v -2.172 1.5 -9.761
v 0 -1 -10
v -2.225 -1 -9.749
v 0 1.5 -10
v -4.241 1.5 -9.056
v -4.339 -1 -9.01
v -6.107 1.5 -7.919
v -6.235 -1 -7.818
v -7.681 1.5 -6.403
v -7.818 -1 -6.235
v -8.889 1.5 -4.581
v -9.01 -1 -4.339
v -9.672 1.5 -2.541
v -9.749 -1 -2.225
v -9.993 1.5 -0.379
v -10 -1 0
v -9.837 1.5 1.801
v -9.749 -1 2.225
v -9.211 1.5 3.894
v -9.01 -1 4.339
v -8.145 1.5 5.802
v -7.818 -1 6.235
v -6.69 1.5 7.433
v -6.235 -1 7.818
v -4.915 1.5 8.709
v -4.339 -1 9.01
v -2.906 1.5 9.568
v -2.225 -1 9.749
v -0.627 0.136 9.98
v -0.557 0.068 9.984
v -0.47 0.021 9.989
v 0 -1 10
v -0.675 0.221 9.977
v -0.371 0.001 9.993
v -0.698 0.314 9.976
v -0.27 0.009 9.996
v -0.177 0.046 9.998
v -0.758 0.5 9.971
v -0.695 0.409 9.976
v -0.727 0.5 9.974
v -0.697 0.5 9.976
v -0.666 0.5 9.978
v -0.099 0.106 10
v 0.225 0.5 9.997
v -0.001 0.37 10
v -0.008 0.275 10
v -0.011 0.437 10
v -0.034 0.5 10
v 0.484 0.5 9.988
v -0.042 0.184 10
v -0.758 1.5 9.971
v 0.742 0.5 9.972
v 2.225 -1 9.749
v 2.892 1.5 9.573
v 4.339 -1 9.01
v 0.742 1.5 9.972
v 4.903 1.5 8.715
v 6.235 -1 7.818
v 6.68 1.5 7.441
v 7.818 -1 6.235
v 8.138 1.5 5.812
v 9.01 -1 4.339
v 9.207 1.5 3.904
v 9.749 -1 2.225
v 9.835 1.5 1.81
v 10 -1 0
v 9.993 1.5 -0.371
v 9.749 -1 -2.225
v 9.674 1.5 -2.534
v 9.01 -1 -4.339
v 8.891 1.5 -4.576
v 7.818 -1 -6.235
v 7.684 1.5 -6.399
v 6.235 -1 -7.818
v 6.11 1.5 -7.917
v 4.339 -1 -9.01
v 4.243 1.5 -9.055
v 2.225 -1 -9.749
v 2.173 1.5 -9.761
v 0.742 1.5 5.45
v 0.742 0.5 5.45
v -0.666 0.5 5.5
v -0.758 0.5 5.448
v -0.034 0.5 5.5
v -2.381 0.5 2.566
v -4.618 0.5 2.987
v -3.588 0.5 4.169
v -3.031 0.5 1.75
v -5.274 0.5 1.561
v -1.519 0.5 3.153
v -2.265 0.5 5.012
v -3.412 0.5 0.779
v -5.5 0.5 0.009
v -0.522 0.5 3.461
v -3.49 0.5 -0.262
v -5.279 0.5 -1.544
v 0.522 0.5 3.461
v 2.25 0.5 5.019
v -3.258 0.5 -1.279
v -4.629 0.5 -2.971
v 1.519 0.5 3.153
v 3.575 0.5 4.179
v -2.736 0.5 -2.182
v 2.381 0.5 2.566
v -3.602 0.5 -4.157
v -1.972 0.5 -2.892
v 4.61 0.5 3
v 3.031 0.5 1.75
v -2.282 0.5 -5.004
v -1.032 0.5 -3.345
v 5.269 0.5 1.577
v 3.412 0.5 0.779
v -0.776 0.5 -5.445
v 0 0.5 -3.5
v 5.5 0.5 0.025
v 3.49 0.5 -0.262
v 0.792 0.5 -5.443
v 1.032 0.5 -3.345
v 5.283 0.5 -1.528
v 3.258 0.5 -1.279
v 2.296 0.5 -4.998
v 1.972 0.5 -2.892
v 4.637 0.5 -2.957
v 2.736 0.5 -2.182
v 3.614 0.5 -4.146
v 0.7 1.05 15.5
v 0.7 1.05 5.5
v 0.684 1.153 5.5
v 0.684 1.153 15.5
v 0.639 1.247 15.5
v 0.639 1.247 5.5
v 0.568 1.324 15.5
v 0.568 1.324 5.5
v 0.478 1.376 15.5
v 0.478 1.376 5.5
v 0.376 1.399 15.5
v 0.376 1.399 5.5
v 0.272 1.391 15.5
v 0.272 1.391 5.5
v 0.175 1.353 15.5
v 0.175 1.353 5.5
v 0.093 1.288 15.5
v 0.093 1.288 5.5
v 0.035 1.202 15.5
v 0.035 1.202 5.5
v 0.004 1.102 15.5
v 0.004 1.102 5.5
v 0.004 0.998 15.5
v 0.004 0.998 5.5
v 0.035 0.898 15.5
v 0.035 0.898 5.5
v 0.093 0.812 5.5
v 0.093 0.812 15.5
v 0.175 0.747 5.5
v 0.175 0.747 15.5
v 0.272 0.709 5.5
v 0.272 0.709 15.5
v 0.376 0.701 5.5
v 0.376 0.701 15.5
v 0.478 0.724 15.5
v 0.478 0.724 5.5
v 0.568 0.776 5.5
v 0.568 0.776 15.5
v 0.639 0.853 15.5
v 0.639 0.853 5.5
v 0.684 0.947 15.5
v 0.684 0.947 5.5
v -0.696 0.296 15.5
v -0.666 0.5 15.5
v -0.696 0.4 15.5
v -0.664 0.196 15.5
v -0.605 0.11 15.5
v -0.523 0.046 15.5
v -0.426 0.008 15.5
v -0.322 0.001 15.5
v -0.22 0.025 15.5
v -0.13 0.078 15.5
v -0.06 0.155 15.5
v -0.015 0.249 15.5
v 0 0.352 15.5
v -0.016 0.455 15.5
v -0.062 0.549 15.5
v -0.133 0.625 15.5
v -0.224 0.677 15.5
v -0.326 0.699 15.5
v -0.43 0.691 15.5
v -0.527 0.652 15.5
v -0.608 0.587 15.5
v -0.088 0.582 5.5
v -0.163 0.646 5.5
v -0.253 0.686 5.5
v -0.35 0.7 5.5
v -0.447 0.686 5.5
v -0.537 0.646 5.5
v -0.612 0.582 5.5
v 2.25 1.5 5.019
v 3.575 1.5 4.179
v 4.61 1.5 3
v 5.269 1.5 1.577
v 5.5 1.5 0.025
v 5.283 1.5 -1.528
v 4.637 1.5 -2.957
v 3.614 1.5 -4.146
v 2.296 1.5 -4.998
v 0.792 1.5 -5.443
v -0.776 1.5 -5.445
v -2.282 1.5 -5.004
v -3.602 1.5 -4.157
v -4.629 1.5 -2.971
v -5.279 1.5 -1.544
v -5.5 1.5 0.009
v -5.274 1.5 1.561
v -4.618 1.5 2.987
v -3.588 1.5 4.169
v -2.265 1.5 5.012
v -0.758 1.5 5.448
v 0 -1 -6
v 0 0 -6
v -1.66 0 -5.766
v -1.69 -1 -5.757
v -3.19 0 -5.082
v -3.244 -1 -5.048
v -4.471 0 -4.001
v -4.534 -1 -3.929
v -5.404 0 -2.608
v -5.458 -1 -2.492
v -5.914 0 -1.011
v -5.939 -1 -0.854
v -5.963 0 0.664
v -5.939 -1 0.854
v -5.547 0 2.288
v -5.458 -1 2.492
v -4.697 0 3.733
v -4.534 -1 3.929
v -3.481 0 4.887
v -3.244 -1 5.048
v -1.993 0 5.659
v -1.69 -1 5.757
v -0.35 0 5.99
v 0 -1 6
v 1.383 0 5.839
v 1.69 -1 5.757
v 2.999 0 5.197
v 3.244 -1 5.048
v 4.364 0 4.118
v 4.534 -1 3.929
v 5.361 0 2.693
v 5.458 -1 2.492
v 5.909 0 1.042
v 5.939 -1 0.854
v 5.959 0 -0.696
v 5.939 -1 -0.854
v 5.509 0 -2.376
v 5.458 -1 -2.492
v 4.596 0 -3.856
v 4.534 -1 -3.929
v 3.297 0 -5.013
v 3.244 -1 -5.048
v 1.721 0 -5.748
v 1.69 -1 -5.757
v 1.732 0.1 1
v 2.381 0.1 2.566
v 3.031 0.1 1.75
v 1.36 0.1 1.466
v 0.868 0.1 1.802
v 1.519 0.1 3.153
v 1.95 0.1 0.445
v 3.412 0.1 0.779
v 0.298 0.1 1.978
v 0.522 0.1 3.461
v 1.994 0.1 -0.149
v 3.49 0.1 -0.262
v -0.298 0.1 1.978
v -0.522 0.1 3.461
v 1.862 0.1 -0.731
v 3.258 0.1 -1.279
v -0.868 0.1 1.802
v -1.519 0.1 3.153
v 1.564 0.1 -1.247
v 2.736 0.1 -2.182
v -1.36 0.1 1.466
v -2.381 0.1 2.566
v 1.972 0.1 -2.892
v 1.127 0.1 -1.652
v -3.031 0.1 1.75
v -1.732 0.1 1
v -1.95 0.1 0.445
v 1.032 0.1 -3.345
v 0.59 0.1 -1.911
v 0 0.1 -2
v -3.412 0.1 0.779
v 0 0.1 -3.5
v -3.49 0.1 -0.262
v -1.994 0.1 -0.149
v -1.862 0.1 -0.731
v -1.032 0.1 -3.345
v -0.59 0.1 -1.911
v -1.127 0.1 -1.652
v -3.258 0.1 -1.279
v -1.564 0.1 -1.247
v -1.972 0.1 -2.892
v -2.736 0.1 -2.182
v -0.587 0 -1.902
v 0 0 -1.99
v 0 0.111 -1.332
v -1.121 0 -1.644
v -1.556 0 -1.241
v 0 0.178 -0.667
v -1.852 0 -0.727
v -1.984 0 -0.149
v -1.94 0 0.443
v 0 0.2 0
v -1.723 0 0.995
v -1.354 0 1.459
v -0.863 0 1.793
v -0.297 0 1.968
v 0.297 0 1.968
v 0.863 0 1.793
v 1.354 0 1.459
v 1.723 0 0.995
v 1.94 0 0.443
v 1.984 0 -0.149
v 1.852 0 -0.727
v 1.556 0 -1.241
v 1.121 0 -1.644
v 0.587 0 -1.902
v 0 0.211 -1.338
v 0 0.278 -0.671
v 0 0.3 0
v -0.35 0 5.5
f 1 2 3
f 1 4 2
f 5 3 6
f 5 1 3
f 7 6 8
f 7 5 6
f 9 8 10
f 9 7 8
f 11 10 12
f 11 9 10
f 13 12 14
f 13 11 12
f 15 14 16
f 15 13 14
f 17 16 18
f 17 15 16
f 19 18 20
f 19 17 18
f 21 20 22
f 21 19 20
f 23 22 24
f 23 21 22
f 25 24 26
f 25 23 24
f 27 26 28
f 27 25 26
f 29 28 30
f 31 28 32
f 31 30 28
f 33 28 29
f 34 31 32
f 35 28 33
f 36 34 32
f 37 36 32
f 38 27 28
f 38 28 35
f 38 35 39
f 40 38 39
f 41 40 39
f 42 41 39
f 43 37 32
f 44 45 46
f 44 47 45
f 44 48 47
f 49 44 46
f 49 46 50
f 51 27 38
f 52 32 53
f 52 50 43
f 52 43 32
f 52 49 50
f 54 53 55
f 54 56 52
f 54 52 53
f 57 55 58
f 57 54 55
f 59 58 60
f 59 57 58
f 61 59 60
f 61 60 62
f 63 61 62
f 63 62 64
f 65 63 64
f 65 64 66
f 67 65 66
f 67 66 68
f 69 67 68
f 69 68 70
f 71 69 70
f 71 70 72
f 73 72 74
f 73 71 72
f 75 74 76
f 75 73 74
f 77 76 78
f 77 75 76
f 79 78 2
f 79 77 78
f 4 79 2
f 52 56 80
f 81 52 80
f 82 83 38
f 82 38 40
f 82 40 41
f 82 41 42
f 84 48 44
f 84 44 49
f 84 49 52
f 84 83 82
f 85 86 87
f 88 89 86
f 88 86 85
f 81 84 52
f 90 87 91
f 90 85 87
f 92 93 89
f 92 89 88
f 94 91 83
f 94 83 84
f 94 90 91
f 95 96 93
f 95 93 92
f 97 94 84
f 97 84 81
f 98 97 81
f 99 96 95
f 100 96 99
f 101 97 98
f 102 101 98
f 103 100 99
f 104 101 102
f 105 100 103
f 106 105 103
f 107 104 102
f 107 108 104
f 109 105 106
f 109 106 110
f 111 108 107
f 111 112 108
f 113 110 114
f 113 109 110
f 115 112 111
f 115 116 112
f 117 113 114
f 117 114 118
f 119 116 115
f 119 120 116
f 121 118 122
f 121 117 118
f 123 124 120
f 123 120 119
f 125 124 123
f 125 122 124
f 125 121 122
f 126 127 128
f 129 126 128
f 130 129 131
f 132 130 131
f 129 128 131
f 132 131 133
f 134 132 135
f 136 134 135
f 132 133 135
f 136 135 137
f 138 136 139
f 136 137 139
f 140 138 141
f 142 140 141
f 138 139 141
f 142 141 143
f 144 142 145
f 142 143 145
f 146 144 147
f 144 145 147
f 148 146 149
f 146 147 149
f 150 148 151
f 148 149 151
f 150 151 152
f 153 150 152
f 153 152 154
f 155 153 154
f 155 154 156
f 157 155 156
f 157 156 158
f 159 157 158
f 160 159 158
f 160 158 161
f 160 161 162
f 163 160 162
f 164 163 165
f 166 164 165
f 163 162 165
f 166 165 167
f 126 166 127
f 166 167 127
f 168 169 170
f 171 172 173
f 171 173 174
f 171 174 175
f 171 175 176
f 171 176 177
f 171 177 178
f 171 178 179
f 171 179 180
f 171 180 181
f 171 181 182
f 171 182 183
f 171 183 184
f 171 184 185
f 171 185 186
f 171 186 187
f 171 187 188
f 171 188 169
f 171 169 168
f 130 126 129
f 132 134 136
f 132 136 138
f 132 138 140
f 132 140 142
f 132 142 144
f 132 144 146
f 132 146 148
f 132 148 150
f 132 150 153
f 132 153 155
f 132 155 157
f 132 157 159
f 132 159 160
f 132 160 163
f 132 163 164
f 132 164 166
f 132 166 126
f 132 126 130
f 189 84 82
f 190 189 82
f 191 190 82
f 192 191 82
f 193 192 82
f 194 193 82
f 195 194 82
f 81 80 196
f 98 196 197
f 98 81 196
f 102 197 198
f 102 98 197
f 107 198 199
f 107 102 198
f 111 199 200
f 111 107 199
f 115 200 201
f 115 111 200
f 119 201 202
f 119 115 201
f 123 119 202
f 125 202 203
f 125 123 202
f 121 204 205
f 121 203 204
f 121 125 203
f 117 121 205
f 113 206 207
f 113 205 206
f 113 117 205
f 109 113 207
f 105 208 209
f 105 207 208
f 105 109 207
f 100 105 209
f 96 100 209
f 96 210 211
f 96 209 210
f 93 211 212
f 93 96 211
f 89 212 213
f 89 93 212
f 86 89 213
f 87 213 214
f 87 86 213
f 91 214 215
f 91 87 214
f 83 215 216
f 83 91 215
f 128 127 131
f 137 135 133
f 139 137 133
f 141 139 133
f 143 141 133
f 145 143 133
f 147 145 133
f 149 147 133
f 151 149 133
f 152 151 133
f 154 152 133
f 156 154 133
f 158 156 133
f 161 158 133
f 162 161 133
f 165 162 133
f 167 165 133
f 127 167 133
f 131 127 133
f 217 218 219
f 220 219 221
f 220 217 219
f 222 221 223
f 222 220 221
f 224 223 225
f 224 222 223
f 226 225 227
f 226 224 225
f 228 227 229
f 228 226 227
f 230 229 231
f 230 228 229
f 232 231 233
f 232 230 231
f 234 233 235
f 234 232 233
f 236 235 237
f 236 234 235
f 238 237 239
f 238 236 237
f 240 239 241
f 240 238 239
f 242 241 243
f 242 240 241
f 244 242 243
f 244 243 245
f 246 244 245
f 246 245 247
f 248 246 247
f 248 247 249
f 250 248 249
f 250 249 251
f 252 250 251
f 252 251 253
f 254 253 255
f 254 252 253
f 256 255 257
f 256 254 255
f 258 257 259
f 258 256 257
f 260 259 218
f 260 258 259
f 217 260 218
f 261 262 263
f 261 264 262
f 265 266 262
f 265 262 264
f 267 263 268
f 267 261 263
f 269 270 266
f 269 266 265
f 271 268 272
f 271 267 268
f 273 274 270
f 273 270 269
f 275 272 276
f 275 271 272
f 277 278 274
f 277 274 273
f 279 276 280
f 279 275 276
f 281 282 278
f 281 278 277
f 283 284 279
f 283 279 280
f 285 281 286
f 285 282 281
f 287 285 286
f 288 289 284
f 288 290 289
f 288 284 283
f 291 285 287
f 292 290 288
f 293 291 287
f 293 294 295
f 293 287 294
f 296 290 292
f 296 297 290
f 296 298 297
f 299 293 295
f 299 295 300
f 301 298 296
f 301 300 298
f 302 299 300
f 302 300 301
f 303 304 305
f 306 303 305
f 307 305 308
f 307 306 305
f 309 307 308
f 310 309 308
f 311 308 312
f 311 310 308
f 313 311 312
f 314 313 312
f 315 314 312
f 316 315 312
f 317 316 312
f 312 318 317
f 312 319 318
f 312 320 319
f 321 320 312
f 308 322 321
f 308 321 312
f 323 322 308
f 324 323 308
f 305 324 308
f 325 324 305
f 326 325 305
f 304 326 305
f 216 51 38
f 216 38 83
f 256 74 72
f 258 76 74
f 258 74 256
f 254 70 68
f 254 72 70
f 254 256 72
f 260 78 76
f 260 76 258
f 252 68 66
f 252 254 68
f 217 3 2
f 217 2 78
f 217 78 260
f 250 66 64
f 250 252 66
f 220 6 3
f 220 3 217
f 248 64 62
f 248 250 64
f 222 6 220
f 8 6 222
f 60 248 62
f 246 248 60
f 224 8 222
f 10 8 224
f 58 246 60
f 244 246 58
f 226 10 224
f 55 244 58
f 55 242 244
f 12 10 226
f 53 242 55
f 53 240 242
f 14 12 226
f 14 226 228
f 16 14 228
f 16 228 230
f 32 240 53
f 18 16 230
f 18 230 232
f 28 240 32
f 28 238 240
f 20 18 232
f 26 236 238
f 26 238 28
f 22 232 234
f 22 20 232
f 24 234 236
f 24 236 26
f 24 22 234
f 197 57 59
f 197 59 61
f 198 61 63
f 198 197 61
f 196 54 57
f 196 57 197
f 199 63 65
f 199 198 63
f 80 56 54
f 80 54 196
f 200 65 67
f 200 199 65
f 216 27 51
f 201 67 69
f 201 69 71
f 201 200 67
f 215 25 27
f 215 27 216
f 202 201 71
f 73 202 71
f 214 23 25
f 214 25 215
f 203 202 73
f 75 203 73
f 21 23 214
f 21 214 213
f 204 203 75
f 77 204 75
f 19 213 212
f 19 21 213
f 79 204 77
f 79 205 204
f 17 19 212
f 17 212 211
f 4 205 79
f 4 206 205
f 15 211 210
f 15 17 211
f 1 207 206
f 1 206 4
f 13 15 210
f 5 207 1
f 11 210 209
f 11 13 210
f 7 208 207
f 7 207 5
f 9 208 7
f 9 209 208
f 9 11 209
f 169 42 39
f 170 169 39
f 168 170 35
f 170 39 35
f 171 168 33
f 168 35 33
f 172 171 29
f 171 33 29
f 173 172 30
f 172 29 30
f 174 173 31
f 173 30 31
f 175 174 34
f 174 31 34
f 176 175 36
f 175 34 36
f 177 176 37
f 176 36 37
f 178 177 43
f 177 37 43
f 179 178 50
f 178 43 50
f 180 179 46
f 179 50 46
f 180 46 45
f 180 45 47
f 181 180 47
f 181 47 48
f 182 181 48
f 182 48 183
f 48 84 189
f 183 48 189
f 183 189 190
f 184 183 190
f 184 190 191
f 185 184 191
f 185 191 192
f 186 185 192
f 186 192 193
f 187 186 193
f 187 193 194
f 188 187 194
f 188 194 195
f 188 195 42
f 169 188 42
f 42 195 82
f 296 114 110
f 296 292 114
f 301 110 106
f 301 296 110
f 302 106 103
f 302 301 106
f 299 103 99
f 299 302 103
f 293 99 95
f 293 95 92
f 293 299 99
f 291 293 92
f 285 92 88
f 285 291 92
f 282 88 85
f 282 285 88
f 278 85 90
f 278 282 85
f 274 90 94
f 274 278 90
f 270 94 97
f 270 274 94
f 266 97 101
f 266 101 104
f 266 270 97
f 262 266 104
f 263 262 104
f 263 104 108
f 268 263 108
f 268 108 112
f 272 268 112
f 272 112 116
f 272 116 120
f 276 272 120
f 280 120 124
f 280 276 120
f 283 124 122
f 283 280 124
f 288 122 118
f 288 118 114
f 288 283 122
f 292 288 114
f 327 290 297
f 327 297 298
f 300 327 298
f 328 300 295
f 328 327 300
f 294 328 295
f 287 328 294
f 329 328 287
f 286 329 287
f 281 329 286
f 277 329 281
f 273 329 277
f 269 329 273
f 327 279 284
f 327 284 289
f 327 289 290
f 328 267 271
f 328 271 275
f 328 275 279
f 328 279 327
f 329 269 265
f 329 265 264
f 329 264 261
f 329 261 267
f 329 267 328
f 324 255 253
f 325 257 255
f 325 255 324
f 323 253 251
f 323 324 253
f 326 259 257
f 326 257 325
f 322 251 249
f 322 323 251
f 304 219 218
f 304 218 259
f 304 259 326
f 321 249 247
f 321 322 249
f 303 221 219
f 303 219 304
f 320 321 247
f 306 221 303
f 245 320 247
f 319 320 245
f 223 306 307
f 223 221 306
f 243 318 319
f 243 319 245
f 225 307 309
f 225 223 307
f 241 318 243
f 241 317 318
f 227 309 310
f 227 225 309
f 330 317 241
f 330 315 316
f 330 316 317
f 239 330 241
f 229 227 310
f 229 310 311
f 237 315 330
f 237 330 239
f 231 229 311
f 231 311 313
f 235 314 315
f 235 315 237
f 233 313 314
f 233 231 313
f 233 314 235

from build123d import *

# Parameters (mm, degrees)
SKETCH5_W           = 1.5
SKETCH5_H           = 6.361903522
CUT_EXTRUDE1_DEPTH  = 1
BOSS_EXTRUDE1_START = 5.5
SKETCH3_R           = 0.35
BOSS_EXTRUDE1_DEPTH = 10


with BuildPart() as part:
    # Sketch2 → Revolve1 (revolve)
    with BuildSketch(Plane.XY, mode=Mode.PRIVATE) as revolve1_sk:
        with BuildLine():
            Line((-1.989974874, 0), (-6, 0))
            Line((-6, 0), (-6, -1))
            Line((-6, -1), (-10, -1))
            Line((-10, -1), (-10, 1.5))
            Line((-10, 1.5), (-5.5, 1.5))
            Line((-5.5, 1.5), (-5.5, 0.5))
            Line((-5.5, 0.5), (-3.5, 0.5))
            Line((-3.5, 0.5), (-3.5, 0.1))
            Line((-3.5, 0.1), (-2, 0.1))
            ThreePointArc((-2, 0.1), (-1.004987562, 0.249875621), (0, 0.3))
            Line((0, 0.3), (0, 0.2))
            ThreePointArc((0, 0.2), (-1, 0.149874371), (-1.989974874, 0))
        make_face()
    revolve(revolve1_sk.sketch.rotate(Axis((0, -1.216210025, 0), (0, 1, 0)), 270), axis=Axis((0, -1.216210025, 0), (0, 1, 0)))

    # Sketch5 → Cut-Extrude1 (cut)
    with BuildSketch(Plane(origin=(0, 1.5, 0), x_dir=(1, 0, 0), z_dir=(0, 1, 0))):
        with Locations((-0.007942998, -7.408272411)):
            Rectangle(SKETCH5_W, SKETCH5_H)
    extrude(amount=-CUT_EXTRUDE1_DEPTH, mode=Mode.SUBTRACT)

    # Sketch3 → Boss-Extrude1 (add)
    with BuildSketch(Plane.XY.offset(BOSS_EXTRUDE1_START)):
        with Locations(Location((-0.35, 0.35, 0), (0, 0, 154.623066475))):
            Circle(SKETCH3_R)
        with Locations((0.35, 1.05)):
            Circle(SKETCH3_R)
    extrude(amount=BOSS_EXTRUDE1_DEPTH)


with BuildPart() as boss_extrude1_piece_1:
    # of the separate pieces the step leaves, piece 1, a body of its own (boss_extrude1_pieces)
    add(part.part.solids().sort_by_distance((0, 0.2, 0))[0])


with BuildPart() as boss_extrude1_piece_2:
    # of the separate pieces the step leaves, piece 2, a body of its own (boss_extrude1_pieces)
    add(part.part.solids().sort_by_distance((0.7, 1.05, 5.5))[0])


solid = Compound([boss_extrude1_piece_1.part, boss_extrude1_piece_2.part])
